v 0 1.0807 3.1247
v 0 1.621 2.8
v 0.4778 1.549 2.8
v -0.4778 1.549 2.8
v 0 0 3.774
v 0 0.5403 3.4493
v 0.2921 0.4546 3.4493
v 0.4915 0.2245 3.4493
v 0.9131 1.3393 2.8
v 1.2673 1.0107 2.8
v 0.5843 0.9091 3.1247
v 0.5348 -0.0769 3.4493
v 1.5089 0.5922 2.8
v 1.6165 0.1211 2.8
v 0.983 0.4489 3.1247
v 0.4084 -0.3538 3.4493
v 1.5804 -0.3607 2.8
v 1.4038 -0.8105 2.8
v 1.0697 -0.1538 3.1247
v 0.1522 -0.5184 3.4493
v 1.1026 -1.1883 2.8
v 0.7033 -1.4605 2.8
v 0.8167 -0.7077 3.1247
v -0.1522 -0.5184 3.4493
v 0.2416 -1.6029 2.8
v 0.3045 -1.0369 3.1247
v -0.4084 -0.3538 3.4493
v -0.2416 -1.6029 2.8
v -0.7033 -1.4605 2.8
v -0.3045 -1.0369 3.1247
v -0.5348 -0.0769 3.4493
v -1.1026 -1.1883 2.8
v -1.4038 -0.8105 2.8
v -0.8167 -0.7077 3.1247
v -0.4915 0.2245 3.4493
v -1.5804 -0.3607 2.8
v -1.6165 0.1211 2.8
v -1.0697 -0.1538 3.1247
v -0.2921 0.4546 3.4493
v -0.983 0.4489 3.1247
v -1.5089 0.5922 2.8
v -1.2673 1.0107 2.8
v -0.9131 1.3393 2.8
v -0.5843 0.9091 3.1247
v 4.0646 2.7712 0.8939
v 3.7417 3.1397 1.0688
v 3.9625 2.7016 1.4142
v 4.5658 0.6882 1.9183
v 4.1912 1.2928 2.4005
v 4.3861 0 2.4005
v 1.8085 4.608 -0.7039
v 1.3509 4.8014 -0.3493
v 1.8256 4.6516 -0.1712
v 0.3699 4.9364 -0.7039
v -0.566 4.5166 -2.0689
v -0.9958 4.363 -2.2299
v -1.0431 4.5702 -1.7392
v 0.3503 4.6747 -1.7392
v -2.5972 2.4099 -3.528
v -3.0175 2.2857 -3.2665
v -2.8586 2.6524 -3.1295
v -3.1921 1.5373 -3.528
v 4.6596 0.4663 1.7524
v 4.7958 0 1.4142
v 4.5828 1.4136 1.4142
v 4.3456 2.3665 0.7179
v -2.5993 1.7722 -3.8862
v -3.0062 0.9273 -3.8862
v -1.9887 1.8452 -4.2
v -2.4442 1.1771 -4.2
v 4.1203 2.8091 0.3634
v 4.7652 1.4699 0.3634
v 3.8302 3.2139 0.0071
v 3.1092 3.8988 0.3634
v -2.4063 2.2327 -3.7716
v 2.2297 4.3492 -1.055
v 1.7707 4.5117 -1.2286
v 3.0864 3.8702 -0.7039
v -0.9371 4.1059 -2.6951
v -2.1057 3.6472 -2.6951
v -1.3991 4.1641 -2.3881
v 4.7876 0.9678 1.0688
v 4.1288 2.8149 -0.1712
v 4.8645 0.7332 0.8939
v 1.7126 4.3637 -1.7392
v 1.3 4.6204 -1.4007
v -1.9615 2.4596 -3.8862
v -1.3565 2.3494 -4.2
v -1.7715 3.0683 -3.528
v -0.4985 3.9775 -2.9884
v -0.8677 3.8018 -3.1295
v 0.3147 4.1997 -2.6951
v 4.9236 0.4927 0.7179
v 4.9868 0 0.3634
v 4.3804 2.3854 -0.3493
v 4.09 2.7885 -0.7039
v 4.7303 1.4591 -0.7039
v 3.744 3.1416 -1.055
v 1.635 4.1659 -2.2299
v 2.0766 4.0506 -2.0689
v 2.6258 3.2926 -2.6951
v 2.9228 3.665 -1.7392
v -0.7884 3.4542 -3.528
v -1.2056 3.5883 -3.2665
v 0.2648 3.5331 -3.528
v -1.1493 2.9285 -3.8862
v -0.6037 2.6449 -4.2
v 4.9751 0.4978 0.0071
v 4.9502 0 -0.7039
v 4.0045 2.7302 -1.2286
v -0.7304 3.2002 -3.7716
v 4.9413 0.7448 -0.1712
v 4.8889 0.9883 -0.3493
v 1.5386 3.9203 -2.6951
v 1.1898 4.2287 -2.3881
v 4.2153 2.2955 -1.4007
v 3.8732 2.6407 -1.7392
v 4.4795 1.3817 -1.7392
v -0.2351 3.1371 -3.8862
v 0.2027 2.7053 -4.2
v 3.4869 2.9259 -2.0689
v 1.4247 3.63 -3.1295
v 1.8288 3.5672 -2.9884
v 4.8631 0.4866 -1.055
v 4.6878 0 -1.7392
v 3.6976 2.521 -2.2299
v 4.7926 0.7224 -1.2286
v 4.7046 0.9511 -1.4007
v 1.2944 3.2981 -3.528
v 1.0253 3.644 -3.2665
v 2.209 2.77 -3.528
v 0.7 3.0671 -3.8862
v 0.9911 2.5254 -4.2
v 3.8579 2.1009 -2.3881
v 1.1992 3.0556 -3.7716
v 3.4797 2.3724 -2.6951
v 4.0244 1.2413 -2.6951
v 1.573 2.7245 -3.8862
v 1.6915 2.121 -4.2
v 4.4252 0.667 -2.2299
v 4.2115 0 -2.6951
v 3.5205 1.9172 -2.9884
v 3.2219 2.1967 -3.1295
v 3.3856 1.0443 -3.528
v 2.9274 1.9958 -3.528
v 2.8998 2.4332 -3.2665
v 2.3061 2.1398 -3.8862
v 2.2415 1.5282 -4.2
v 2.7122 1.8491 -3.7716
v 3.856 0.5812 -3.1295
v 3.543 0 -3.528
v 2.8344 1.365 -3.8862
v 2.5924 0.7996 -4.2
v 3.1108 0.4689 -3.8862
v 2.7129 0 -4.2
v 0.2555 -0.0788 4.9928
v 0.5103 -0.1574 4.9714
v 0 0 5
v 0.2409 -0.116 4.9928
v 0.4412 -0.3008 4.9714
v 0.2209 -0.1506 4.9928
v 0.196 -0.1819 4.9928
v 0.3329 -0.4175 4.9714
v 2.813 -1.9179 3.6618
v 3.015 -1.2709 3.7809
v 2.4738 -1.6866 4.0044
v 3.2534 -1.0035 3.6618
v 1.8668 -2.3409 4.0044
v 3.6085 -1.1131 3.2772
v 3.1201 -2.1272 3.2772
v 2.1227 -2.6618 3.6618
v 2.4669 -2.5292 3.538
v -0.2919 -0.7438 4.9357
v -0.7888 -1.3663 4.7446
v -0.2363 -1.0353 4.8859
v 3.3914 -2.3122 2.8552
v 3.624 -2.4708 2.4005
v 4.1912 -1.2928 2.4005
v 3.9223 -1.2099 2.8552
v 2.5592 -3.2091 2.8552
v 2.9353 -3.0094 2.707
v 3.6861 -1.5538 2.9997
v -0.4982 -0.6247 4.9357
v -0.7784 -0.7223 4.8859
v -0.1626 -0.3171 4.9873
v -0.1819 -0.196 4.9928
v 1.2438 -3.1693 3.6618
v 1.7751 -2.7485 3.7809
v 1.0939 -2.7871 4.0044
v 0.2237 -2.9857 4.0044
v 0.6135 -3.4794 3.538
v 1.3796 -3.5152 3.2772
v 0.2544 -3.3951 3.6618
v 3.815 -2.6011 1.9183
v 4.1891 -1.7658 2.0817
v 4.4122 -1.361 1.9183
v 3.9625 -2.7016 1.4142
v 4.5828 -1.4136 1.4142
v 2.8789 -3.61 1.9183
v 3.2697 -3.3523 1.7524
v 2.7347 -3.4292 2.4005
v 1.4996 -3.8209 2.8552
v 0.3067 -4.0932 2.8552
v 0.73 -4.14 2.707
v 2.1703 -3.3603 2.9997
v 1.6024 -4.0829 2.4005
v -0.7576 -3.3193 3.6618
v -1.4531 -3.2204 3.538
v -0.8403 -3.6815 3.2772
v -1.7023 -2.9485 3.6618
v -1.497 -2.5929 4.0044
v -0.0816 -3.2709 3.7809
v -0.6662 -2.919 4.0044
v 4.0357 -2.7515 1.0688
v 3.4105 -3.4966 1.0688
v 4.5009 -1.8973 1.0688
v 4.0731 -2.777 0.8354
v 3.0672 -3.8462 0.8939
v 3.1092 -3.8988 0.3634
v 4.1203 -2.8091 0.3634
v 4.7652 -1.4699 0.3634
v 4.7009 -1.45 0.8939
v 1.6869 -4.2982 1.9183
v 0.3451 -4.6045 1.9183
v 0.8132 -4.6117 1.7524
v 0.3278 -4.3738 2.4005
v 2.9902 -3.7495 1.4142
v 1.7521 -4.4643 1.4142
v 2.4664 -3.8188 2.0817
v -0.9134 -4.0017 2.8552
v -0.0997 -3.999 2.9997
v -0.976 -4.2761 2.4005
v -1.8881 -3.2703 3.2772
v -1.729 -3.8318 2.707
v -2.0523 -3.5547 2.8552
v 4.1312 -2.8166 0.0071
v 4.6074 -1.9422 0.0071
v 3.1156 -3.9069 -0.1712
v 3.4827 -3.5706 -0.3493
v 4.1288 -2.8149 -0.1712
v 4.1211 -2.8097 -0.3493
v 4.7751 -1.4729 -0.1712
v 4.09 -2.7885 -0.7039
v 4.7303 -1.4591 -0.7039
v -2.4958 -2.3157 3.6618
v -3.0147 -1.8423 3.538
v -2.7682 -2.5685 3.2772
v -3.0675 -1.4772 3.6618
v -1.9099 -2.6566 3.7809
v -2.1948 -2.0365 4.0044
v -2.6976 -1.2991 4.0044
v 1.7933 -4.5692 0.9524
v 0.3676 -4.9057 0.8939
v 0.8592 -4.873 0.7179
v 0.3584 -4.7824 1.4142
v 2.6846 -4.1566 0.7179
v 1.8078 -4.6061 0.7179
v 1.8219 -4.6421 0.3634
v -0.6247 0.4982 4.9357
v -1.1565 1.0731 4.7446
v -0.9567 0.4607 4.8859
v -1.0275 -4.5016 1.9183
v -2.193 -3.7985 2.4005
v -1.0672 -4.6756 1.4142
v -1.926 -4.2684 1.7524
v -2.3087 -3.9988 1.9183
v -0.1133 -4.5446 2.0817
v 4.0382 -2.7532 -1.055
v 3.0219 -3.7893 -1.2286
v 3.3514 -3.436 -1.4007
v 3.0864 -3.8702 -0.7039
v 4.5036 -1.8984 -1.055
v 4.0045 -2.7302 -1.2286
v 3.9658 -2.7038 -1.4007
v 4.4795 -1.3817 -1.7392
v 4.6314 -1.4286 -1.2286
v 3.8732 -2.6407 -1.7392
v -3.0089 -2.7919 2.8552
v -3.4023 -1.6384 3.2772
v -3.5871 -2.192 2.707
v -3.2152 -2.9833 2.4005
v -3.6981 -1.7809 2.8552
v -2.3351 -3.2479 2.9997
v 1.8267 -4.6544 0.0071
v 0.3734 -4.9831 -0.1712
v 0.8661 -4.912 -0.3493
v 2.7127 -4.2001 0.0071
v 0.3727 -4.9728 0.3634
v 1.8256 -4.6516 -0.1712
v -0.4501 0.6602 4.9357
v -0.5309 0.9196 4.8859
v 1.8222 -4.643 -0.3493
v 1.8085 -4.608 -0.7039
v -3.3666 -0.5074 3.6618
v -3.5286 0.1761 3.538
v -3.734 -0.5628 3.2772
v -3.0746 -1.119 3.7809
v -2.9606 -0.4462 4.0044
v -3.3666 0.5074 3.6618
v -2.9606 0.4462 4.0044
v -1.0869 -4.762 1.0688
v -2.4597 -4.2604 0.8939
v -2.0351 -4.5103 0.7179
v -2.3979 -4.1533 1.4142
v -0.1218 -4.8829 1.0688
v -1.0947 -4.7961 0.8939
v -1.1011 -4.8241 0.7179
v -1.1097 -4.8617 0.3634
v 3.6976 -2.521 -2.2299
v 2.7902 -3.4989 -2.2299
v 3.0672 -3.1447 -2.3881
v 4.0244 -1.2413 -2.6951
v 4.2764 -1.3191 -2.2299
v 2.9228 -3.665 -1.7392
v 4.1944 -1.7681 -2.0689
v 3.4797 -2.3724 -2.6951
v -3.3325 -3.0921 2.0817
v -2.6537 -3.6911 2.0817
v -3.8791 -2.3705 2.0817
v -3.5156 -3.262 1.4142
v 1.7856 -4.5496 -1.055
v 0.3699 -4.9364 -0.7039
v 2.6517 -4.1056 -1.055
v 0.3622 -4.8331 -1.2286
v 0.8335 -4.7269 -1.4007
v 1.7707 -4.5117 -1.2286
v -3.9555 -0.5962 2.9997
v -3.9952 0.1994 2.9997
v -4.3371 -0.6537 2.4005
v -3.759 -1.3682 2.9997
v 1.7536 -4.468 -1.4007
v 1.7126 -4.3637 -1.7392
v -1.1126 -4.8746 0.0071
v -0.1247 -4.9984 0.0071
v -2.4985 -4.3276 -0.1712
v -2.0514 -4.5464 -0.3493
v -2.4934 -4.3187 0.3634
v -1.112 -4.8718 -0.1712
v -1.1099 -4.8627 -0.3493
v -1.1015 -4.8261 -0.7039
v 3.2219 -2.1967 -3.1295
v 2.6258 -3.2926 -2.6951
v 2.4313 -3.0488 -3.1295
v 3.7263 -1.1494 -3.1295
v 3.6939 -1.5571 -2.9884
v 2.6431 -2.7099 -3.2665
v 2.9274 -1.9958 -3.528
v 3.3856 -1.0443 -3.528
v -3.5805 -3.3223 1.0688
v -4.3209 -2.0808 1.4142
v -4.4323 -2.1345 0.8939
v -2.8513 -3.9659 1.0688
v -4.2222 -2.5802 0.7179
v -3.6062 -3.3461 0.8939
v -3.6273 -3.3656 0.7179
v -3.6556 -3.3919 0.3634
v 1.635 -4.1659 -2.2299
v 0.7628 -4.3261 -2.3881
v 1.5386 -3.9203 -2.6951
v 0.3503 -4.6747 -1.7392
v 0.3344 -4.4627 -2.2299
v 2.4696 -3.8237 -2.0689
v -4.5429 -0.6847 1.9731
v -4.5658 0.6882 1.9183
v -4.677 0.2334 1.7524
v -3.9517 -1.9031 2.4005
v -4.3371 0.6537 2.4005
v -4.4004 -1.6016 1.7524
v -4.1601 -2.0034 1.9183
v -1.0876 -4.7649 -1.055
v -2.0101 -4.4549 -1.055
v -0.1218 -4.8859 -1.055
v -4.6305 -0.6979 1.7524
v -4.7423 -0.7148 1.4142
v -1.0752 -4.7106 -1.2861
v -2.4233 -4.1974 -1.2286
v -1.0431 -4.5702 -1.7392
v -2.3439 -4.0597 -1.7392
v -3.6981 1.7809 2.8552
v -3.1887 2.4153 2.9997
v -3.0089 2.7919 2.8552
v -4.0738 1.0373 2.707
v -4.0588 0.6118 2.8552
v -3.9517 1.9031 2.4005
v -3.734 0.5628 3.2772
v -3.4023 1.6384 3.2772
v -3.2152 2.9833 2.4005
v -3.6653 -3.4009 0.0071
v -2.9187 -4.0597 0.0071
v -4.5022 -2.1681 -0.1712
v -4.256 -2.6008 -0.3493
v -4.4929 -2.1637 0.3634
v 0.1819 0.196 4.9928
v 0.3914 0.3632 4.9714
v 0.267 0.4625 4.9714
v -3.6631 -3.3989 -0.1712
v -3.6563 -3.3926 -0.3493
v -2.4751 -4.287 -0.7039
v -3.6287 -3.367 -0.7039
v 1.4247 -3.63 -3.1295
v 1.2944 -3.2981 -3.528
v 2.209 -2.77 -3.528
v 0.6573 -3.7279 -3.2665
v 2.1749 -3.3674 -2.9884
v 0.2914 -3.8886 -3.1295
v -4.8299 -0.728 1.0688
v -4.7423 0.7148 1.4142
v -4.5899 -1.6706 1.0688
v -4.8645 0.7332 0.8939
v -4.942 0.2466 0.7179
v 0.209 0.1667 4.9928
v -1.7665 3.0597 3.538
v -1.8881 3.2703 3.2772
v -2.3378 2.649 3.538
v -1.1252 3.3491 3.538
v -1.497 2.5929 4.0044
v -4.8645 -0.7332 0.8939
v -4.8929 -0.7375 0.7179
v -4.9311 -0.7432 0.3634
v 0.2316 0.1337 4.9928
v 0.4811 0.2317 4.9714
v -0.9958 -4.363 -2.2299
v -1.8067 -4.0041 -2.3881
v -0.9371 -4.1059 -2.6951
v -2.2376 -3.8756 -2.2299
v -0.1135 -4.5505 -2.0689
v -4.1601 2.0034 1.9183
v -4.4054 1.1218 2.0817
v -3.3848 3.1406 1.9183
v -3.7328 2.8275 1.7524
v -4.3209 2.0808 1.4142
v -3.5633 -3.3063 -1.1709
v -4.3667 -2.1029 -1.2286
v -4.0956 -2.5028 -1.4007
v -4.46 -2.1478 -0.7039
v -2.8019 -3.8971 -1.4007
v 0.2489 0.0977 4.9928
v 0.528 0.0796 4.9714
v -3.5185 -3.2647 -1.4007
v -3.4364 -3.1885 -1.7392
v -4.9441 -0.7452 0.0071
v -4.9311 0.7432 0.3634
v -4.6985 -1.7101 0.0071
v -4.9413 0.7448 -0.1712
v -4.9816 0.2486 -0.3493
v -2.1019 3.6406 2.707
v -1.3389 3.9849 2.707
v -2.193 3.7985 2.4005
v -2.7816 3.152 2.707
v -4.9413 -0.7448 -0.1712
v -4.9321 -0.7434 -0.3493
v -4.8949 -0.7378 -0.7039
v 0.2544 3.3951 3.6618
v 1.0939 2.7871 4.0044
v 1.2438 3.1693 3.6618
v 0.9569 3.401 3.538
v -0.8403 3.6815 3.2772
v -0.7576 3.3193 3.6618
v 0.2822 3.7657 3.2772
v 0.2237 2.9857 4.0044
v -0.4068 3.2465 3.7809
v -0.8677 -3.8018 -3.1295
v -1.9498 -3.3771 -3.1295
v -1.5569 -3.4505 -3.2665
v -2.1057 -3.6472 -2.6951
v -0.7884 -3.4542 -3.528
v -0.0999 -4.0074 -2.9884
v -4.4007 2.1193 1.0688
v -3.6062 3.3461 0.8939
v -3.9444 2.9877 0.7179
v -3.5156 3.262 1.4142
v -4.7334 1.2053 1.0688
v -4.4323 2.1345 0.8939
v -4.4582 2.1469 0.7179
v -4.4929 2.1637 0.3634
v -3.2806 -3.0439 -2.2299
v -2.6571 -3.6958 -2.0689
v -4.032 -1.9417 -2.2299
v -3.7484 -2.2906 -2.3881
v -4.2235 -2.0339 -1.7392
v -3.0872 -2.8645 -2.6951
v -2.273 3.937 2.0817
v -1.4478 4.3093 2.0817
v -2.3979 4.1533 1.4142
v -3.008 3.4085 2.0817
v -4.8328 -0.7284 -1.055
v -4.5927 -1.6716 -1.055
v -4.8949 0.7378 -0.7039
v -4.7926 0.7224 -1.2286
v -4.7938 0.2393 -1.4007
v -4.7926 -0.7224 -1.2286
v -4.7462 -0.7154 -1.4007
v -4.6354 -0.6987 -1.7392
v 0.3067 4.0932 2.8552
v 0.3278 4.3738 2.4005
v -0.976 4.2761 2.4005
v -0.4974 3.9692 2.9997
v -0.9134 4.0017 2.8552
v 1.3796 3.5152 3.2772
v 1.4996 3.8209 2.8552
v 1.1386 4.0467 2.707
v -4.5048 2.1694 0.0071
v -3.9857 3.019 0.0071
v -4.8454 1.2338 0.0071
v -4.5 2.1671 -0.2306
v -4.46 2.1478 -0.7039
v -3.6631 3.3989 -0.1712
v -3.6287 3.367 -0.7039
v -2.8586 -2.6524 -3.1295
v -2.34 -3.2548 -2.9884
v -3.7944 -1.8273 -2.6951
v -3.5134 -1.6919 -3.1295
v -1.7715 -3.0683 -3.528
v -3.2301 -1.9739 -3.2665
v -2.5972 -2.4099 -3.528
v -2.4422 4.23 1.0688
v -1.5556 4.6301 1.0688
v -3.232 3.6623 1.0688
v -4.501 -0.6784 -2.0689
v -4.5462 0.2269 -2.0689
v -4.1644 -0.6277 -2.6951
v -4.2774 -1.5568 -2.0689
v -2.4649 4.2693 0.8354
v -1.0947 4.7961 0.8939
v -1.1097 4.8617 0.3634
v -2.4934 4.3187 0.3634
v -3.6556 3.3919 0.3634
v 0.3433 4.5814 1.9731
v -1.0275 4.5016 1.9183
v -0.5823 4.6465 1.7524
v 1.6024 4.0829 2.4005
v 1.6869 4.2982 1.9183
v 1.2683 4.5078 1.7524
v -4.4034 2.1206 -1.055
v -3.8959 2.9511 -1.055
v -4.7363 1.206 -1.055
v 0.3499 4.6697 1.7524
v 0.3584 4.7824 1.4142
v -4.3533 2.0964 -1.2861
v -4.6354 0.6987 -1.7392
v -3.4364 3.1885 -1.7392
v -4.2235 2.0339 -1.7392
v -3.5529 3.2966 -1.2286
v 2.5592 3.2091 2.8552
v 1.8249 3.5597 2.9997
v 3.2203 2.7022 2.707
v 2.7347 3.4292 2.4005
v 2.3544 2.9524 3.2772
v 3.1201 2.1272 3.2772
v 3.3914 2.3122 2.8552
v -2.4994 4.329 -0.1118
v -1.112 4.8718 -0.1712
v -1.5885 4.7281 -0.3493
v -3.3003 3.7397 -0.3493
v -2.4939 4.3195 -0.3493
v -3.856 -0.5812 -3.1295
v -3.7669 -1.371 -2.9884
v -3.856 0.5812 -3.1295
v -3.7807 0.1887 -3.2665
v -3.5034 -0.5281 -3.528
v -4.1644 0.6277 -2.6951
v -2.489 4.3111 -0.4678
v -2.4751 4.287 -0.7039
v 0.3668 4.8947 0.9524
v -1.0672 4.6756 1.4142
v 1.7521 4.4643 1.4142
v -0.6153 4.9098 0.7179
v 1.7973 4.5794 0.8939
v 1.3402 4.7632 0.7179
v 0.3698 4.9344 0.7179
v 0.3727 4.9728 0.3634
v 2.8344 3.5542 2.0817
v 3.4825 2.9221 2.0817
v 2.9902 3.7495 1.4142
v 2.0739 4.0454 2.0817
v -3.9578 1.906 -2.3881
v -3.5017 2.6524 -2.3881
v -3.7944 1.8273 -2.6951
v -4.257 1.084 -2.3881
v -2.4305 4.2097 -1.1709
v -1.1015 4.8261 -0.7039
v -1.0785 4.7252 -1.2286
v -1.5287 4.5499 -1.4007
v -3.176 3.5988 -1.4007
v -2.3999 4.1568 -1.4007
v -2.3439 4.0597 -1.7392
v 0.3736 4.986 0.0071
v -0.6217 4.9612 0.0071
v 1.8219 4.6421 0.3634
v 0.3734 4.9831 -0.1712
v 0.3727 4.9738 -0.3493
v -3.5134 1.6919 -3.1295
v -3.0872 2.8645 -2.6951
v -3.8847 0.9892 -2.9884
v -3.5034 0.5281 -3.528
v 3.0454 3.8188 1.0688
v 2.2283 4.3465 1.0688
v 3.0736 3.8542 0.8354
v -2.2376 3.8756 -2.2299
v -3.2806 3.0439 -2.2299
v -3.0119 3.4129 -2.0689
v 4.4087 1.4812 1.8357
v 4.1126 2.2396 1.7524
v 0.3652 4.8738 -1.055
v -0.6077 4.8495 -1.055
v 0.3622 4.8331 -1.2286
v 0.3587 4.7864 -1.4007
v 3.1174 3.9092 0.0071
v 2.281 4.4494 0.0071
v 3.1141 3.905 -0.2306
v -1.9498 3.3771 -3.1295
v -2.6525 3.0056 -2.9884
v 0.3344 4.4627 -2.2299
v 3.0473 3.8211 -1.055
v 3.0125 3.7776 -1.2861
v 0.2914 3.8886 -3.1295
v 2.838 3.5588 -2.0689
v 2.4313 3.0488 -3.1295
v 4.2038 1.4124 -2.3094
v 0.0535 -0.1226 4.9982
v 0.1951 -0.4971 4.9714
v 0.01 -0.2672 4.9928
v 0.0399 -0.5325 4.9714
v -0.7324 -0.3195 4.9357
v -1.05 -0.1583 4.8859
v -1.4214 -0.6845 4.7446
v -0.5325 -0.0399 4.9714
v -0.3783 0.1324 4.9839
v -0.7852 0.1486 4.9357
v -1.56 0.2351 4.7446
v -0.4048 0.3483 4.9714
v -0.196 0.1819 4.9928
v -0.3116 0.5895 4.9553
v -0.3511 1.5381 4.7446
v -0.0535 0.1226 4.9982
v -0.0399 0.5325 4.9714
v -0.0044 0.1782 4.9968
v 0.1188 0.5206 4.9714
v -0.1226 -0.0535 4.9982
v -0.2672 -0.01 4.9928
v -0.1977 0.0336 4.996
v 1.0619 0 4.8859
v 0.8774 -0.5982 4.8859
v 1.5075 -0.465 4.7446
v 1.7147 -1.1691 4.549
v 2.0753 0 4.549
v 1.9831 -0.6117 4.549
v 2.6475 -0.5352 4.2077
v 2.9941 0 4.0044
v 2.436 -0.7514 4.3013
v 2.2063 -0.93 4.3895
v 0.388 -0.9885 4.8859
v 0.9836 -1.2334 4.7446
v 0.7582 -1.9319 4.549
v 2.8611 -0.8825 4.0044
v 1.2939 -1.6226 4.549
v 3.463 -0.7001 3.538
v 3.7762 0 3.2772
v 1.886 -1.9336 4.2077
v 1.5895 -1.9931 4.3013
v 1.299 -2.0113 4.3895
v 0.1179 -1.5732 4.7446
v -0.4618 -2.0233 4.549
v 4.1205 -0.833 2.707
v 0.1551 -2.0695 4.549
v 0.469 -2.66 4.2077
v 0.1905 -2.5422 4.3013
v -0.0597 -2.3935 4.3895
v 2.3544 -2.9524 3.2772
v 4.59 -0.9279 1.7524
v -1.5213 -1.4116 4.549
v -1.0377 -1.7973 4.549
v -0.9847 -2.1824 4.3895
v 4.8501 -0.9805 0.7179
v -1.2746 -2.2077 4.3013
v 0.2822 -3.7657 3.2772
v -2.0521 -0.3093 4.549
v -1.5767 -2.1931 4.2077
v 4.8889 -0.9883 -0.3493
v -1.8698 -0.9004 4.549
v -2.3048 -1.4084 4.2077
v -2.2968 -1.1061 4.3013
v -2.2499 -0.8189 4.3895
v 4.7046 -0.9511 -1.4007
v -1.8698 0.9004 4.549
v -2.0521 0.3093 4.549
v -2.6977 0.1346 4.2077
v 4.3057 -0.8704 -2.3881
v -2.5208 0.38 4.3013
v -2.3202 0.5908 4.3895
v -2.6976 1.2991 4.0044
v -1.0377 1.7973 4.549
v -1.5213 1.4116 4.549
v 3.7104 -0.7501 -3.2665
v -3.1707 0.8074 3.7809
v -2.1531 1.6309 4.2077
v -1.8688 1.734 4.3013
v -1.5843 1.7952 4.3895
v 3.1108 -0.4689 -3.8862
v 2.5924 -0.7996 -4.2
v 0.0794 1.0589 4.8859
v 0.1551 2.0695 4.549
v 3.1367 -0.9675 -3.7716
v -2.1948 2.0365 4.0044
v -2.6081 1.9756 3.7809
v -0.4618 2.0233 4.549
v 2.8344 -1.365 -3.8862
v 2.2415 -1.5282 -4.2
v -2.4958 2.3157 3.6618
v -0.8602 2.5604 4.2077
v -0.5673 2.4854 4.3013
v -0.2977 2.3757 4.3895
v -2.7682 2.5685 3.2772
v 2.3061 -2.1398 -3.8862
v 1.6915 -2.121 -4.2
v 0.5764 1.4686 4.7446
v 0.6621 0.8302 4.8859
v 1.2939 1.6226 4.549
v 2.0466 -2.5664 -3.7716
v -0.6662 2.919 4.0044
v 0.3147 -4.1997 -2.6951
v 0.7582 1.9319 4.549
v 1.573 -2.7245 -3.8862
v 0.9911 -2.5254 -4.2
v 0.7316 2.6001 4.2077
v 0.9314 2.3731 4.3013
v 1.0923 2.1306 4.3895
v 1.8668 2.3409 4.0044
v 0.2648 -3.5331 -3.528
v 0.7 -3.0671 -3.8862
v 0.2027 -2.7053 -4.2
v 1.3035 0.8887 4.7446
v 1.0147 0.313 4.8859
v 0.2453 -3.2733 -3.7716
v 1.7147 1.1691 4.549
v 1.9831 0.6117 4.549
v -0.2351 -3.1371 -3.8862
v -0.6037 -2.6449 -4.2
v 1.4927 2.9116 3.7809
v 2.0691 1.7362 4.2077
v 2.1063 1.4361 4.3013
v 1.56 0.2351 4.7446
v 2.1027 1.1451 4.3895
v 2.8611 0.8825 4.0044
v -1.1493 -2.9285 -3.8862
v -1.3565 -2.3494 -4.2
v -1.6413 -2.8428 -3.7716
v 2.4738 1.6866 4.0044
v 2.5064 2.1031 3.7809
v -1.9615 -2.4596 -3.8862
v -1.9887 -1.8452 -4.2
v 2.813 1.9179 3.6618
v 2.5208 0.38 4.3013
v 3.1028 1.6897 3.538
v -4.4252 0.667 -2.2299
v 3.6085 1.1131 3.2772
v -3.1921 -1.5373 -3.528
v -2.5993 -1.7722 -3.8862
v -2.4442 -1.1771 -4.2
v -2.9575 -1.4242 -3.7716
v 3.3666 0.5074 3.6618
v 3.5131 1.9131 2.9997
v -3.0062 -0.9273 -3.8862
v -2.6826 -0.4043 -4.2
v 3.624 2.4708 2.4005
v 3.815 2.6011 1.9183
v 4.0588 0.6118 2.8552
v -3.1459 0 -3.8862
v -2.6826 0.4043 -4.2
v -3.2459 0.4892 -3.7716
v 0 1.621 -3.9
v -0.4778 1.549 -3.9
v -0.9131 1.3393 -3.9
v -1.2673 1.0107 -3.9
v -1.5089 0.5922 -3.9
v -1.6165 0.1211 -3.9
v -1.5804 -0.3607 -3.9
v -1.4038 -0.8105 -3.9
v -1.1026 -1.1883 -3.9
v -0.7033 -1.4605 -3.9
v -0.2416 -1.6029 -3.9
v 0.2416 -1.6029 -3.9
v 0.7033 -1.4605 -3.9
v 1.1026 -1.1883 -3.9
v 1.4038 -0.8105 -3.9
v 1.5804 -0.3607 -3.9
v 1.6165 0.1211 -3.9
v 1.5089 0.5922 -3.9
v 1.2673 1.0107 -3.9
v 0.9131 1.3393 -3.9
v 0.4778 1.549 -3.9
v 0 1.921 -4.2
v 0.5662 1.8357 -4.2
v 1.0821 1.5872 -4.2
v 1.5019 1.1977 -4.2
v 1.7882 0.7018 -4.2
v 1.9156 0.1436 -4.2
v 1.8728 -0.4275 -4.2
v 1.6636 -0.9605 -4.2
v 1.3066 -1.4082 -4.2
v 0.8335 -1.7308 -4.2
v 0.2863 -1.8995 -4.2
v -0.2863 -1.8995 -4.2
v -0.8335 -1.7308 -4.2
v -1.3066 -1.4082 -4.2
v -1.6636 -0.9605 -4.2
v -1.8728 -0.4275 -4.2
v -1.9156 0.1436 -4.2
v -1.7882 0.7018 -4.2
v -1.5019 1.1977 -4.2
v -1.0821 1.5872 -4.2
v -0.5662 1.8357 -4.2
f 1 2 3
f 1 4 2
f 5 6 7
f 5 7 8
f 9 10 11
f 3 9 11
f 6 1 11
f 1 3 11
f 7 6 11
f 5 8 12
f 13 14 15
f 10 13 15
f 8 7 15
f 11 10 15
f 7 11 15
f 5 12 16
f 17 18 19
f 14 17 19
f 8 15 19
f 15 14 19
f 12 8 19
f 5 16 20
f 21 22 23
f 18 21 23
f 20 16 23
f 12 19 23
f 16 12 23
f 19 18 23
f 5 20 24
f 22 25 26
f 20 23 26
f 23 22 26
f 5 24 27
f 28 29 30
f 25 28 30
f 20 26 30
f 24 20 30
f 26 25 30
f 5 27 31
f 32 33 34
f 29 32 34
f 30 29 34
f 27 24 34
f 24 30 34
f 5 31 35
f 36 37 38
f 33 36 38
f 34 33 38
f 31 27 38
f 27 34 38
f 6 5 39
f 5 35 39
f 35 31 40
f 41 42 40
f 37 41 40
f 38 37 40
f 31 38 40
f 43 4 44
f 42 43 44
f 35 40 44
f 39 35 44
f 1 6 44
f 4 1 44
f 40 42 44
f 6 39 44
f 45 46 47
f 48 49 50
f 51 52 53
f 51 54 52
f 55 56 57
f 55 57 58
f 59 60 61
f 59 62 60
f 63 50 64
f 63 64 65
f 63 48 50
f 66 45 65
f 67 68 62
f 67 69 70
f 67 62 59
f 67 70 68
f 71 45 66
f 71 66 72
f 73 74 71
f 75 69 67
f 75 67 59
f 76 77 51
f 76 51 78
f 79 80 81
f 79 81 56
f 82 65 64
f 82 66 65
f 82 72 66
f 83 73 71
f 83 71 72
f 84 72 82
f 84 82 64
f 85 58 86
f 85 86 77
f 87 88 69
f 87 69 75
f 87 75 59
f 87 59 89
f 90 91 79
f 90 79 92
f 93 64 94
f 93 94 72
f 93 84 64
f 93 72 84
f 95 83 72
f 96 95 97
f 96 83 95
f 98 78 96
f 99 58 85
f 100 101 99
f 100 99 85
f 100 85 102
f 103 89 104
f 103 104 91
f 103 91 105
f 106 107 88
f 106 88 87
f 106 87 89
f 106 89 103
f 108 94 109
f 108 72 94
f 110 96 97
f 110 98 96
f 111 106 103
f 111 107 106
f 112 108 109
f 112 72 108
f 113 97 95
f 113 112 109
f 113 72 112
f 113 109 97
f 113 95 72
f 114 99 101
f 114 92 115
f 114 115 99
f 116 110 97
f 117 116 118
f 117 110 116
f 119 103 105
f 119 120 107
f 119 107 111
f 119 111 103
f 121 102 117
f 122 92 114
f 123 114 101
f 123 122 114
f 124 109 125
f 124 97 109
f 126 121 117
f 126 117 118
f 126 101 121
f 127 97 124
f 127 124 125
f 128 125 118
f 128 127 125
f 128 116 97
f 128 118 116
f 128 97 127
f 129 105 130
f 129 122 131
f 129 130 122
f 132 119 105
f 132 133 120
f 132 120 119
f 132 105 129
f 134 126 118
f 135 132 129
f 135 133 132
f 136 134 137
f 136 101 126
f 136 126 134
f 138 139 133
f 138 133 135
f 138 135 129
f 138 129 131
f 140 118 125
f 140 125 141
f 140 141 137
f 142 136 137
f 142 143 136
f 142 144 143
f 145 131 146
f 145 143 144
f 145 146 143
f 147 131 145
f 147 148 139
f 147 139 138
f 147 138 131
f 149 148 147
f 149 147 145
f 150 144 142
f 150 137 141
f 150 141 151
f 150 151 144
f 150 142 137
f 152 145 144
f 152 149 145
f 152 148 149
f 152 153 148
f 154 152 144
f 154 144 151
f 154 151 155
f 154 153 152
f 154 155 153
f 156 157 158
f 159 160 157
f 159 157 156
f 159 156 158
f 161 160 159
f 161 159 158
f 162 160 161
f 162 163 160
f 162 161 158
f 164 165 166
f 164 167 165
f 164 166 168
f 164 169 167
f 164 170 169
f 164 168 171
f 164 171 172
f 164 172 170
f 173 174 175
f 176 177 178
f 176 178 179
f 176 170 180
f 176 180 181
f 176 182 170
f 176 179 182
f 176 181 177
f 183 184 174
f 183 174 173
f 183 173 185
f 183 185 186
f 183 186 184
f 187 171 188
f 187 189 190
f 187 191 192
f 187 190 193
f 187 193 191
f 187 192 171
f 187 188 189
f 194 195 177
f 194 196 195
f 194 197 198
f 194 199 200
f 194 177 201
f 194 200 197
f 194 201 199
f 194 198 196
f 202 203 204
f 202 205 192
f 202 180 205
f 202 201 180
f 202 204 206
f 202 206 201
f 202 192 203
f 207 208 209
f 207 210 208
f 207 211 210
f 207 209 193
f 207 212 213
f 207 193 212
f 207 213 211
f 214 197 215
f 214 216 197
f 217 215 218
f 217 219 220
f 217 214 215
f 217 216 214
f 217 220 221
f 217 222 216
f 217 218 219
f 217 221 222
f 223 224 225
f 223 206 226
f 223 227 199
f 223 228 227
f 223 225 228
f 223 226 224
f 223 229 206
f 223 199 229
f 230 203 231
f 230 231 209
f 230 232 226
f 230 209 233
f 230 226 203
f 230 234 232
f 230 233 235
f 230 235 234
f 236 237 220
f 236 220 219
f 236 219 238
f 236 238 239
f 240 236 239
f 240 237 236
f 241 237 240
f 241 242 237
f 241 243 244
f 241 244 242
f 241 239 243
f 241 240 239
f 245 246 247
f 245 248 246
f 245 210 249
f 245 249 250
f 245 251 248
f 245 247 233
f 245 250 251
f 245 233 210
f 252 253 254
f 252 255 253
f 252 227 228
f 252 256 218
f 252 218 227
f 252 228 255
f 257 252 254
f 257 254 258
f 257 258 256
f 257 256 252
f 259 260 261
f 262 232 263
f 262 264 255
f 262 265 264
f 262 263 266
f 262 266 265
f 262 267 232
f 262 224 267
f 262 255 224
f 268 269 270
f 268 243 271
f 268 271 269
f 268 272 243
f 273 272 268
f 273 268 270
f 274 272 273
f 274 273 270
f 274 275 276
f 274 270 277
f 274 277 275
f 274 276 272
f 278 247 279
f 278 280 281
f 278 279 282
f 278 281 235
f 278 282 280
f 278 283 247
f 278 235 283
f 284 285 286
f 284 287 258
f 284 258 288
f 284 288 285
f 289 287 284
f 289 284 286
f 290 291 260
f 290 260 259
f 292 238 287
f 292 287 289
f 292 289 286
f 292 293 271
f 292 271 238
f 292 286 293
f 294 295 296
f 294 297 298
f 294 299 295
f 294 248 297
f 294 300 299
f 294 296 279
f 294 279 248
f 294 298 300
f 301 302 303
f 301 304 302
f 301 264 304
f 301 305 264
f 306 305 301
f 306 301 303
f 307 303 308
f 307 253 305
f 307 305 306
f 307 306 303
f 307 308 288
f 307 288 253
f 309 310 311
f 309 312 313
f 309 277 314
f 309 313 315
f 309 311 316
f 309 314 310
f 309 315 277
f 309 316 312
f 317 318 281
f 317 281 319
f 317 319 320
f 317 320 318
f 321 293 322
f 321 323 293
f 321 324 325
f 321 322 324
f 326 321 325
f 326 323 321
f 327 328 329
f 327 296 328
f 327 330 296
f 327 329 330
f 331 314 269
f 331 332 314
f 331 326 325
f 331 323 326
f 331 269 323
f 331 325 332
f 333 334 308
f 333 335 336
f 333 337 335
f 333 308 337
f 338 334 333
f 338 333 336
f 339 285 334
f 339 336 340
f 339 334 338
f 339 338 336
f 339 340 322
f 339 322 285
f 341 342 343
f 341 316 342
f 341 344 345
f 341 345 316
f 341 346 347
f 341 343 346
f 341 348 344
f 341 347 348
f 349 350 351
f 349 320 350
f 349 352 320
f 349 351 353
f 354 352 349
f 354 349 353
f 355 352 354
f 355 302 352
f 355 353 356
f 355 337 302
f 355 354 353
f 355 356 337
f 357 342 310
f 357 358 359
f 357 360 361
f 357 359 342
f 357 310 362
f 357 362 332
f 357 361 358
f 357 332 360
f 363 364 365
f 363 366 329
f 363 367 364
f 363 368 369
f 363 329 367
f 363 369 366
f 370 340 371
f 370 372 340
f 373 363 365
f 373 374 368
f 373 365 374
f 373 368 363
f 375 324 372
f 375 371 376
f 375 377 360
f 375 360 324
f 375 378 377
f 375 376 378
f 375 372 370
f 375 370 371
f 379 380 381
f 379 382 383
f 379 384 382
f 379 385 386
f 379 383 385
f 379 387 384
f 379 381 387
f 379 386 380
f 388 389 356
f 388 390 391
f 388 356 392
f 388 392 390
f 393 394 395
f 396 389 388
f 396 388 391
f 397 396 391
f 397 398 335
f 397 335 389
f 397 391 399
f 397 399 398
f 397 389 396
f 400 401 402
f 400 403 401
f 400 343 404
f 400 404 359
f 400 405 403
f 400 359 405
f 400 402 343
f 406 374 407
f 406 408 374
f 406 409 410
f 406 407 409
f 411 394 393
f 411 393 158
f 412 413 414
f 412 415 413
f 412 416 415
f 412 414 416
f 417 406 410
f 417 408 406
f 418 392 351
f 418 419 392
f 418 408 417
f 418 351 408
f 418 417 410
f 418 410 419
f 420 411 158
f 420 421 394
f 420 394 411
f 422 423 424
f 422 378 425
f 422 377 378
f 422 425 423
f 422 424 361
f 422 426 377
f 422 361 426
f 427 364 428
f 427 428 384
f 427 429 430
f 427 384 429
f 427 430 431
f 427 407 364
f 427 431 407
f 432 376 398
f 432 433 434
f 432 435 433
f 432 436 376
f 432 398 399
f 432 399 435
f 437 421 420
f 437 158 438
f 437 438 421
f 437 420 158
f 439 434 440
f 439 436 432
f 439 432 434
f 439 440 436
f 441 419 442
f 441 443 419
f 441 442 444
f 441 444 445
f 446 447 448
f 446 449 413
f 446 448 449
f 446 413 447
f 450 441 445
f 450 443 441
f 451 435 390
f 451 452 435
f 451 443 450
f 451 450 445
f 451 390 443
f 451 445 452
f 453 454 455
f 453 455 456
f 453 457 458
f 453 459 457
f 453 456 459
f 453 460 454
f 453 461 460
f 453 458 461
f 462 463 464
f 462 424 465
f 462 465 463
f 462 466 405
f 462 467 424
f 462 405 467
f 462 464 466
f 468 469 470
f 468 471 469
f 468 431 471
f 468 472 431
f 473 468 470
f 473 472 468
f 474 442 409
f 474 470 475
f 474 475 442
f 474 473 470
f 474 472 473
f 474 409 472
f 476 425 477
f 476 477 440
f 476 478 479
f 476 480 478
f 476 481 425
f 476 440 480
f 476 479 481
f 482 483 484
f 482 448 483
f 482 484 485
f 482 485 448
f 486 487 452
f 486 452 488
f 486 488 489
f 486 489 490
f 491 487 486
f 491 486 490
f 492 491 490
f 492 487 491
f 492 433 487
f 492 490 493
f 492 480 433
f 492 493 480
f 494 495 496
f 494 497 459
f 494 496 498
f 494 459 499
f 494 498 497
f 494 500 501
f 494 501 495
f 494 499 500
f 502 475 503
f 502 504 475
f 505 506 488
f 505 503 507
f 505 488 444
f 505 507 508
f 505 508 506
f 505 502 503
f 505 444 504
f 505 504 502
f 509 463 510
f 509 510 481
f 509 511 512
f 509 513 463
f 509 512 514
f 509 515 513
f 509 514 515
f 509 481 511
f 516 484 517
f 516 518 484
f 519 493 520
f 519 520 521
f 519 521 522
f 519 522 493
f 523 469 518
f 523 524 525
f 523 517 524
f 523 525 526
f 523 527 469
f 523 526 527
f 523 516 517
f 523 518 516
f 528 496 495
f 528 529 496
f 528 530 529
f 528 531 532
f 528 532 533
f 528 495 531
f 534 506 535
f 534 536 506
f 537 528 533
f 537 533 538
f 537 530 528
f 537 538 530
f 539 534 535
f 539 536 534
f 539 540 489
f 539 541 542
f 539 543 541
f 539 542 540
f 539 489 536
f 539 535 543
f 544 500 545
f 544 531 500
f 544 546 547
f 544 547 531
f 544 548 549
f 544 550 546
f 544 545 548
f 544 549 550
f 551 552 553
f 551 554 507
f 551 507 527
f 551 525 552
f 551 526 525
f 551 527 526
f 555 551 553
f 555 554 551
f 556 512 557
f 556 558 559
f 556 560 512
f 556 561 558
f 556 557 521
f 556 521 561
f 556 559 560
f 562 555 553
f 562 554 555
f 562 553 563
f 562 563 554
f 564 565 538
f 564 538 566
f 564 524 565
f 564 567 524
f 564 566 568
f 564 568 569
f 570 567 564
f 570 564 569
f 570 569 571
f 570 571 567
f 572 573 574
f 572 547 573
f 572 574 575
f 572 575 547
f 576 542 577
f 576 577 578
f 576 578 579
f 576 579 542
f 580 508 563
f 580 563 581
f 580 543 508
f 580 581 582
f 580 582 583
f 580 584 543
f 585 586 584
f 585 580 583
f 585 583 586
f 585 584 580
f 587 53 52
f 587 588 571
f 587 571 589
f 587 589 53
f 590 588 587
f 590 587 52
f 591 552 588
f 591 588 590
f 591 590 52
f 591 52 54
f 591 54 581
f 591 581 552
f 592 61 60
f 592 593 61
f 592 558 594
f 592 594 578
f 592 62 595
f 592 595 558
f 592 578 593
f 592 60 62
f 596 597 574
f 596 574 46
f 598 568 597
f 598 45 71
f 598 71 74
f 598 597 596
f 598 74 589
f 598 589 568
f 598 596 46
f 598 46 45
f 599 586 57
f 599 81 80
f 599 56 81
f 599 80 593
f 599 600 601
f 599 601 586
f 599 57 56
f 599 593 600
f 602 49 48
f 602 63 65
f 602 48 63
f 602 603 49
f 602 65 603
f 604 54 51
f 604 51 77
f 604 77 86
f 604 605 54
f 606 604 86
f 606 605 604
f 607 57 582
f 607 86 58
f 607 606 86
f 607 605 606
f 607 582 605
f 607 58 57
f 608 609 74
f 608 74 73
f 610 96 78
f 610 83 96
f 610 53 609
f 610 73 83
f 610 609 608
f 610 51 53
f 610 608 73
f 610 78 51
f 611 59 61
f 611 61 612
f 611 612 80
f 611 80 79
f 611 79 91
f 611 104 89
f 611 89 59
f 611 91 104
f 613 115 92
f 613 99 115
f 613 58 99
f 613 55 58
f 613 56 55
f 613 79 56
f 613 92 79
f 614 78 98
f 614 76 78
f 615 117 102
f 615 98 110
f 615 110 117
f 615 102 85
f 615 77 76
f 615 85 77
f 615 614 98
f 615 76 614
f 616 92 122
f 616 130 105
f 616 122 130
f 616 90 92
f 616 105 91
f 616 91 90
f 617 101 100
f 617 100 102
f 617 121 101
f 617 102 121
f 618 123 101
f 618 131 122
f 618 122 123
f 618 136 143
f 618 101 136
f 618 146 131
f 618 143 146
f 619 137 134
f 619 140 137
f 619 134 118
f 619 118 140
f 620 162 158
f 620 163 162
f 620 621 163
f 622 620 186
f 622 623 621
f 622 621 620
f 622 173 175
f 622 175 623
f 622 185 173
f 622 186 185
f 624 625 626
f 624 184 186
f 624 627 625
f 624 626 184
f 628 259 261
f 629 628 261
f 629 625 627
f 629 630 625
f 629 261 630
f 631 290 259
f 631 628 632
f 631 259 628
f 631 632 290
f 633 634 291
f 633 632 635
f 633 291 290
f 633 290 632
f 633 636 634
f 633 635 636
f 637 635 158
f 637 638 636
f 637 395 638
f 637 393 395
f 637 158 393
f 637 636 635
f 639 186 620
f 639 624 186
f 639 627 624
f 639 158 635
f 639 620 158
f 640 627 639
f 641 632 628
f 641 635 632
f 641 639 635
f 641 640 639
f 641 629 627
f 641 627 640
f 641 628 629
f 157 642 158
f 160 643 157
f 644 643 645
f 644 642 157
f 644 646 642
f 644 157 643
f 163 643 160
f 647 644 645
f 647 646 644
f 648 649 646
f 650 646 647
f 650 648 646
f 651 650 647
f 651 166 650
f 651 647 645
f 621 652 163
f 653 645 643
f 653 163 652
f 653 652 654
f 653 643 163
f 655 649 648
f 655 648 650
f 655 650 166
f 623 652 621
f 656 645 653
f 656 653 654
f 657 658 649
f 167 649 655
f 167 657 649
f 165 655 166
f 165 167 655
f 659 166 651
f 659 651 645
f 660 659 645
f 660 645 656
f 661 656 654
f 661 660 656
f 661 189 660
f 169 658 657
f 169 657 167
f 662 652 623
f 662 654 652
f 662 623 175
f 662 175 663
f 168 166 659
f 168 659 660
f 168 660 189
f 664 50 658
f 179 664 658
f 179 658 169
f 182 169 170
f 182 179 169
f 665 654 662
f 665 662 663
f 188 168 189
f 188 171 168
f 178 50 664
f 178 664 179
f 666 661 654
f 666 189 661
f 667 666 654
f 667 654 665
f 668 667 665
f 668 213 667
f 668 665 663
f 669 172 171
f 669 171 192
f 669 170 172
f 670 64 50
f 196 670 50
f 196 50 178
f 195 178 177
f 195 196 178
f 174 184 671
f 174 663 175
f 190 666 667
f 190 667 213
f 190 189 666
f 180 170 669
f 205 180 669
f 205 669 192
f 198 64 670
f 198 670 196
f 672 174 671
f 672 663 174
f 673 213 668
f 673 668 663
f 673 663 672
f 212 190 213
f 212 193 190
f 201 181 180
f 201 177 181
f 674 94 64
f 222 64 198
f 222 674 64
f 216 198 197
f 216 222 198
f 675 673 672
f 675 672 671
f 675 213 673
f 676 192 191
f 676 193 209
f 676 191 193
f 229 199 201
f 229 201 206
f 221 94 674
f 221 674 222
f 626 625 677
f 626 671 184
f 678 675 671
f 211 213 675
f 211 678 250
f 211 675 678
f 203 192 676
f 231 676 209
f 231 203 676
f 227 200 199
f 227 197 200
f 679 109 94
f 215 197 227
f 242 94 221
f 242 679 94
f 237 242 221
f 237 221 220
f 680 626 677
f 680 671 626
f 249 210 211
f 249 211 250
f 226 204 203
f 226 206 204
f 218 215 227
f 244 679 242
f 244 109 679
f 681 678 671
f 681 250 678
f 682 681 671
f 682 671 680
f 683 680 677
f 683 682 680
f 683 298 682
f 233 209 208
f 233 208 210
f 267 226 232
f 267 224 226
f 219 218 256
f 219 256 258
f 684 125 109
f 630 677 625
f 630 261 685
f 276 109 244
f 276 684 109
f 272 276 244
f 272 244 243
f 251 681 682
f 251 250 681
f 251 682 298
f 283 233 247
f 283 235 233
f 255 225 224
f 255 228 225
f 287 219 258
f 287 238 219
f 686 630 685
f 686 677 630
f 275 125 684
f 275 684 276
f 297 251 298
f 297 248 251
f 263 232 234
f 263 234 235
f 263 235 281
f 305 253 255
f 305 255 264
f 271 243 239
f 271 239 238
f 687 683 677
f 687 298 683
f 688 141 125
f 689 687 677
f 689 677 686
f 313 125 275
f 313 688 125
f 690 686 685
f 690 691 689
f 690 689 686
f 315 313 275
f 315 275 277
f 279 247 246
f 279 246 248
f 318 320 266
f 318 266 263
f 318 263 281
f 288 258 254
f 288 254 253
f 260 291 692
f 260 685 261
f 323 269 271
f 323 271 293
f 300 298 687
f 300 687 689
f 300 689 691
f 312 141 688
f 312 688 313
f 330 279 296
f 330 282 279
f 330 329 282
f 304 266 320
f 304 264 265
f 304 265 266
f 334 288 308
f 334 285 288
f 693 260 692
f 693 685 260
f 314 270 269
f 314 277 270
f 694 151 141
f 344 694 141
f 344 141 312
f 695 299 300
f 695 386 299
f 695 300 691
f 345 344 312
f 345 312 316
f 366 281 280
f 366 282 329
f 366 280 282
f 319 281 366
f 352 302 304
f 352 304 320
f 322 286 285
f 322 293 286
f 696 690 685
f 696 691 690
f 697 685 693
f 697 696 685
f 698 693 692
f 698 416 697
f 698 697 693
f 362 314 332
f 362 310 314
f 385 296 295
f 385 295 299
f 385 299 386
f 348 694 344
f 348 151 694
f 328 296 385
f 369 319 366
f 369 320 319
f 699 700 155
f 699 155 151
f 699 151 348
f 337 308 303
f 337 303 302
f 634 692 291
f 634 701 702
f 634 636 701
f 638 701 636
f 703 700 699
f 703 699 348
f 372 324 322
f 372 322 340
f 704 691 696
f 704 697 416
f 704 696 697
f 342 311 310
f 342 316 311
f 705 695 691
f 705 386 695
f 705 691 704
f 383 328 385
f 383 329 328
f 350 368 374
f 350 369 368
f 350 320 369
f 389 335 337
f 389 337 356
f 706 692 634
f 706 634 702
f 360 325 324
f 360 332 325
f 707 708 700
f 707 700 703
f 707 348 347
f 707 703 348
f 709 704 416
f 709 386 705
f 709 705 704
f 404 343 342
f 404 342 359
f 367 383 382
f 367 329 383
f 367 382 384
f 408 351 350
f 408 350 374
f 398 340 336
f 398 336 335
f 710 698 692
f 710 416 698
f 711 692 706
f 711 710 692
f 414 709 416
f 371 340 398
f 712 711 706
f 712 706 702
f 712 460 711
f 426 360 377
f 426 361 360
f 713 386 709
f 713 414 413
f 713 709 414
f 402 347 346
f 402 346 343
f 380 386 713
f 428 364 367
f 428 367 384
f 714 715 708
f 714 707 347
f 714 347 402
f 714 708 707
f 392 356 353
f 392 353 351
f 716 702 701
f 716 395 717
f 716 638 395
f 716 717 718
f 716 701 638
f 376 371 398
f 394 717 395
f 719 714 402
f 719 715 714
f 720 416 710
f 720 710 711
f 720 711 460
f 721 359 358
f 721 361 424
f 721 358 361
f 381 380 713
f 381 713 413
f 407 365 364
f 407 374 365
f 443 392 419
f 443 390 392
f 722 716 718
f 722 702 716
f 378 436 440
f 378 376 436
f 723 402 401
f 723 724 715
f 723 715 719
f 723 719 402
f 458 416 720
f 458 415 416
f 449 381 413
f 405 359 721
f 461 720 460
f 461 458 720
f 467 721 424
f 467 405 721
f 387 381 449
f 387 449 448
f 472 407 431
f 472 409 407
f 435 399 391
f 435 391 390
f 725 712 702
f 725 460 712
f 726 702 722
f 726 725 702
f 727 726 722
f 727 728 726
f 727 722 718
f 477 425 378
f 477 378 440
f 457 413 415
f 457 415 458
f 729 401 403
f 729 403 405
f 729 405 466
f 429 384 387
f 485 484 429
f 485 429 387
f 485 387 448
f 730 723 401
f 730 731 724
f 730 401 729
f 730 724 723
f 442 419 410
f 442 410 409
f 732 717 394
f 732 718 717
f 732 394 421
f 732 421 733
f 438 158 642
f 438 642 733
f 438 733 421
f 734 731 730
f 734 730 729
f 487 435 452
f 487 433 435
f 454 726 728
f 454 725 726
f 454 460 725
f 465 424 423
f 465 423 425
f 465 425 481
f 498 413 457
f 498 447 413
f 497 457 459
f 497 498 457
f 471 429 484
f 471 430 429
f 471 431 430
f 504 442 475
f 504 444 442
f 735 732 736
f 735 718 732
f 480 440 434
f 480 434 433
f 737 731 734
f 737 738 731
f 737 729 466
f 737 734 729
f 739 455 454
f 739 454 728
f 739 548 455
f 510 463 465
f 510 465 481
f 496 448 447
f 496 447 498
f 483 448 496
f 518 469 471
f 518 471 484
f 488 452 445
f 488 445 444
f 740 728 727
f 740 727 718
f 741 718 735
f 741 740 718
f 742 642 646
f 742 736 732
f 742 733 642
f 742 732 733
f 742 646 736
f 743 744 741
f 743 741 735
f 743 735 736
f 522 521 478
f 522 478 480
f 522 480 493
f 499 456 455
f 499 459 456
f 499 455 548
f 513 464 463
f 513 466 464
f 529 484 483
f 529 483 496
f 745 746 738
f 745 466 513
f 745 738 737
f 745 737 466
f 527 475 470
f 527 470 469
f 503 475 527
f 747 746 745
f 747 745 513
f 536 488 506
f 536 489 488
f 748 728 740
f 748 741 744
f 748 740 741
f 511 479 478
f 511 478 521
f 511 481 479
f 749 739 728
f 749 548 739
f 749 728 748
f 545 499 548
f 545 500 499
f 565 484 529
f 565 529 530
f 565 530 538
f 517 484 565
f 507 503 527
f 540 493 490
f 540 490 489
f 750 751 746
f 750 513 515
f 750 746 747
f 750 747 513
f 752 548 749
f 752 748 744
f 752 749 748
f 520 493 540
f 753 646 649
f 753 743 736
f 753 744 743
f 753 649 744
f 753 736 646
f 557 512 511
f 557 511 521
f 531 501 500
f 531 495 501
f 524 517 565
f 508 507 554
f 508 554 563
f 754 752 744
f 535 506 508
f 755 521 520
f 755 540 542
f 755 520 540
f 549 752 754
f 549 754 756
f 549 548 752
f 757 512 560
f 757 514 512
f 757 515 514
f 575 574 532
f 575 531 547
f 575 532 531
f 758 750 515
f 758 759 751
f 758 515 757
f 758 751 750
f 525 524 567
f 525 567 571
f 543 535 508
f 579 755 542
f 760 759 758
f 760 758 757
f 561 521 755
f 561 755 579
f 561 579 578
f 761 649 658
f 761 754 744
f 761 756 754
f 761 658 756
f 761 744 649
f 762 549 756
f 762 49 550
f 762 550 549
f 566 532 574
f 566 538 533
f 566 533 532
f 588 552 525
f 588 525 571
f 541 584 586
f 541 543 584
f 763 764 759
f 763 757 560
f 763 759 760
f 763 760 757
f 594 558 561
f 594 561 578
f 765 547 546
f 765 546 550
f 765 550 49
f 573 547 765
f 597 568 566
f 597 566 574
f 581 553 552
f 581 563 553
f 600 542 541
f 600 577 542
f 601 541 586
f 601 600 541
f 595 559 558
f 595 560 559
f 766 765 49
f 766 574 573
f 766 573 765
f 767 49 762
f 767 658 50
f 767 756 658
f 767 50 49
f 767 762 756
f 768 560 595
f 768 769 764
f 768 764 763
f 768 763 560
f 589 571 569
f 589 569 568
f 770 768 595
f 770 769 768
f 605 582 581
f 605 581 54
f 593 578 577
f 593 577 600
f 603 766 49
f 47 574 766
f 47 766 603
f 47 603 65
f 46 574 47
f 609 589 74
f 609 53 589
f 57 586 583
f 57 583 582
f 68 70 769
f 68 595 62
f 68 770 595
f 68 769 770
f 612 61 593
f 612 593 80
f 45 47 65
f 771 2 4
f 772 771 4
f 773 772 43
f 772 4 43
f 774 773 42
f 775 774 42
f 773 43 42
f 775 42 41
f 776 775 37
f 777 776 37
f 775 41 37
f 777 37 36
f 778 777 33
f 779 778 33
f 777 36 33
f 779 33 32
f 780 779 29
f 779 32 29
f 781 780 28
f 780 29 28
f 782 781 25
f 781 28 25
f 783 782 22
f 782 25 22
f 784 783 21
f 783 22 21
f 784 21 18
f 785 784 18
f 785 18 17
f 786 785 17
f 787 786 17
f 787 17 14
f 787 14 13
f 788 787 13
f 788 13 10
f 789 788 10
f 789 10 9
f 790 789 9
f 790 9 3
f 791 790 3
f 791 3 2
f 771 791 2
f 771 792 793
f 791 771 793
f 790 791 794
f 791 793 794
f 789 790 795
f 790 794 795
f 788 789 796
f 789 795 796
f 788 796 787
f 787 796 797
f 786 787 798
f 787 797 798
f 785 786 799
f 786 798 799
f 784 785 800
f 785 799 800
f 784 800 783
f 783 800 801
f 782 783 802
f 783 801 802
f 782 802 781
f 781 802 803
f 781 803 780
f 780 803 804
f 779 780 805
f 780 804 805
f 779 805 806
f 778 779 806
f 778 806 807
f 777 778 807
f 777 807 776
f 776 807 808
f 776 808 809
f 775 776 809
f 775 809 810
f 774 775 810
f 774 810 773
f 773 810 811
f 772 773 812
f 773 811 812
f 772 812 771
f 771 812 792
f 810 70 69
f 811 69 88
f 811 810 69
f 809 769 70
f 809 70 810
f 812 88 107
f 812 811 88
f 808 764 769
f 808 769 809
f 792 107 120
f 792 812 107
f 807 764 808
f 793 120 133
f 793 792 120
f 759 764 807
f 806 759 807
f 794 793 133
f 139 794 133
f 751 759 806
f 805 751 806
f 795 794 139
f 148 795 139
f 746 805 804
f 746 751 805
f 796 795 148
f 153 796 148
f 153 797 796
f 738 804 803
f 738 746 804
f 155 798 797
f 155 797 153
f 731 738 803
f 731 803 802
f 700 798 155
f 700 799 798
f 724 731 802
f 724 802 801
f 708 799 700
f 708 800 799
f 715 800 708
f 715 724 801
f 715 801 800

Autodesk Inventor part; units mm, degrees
ref_plane "YZ Plane" through (0, 0, 0) normal (1, 0, 0) x (0, 1, 0)
ref_plane "XZ Plane" through (0, 0, 0) normal (0, 1, 0) x (-1, 0, 0)
ref_plane "XY Plane" through (0, 0, 0) normal (0, 0, 1) x (1, 0, 0)
sketch "Sketch5" plane through (0, 0, 0) normal (0, 1, 0) x (-1, 0, 0)
  arc A0 (0, 5) -> (-2.7129, -4.2) centre (0, 0) ccw
  line L0 (-2.7129, -4.2) -> (0, -4.2)
  line L1 (0, 5) -> (0, -4.2)
  dimension "d15" = 10
  dimension "d16" = 9.2
revolve "Revolution1" add sketch "Sketch5" angle 360 about axis through (0, 0, 5) along (0, 0, -1)
sketch "Sketch6" plane through (0, 0, -4.2) normal (0, 0, -1) x (-1, 0, 0)
  circle A0 centre (0, 0) radius 2.7129 projected
hole "Hole1" at (0, 0, -4.2) direction (0, 0, 1) diameter 3.242 depth 7 tip angle 118 thread size "M4x0.7" class "6H" standard "ISO Metric profile"
chamfer "Chamfer1" distance 0.3 angle 45 1 edges at (0, -1.621, -4.2)
properties part number "m3 6" material "Steel"
